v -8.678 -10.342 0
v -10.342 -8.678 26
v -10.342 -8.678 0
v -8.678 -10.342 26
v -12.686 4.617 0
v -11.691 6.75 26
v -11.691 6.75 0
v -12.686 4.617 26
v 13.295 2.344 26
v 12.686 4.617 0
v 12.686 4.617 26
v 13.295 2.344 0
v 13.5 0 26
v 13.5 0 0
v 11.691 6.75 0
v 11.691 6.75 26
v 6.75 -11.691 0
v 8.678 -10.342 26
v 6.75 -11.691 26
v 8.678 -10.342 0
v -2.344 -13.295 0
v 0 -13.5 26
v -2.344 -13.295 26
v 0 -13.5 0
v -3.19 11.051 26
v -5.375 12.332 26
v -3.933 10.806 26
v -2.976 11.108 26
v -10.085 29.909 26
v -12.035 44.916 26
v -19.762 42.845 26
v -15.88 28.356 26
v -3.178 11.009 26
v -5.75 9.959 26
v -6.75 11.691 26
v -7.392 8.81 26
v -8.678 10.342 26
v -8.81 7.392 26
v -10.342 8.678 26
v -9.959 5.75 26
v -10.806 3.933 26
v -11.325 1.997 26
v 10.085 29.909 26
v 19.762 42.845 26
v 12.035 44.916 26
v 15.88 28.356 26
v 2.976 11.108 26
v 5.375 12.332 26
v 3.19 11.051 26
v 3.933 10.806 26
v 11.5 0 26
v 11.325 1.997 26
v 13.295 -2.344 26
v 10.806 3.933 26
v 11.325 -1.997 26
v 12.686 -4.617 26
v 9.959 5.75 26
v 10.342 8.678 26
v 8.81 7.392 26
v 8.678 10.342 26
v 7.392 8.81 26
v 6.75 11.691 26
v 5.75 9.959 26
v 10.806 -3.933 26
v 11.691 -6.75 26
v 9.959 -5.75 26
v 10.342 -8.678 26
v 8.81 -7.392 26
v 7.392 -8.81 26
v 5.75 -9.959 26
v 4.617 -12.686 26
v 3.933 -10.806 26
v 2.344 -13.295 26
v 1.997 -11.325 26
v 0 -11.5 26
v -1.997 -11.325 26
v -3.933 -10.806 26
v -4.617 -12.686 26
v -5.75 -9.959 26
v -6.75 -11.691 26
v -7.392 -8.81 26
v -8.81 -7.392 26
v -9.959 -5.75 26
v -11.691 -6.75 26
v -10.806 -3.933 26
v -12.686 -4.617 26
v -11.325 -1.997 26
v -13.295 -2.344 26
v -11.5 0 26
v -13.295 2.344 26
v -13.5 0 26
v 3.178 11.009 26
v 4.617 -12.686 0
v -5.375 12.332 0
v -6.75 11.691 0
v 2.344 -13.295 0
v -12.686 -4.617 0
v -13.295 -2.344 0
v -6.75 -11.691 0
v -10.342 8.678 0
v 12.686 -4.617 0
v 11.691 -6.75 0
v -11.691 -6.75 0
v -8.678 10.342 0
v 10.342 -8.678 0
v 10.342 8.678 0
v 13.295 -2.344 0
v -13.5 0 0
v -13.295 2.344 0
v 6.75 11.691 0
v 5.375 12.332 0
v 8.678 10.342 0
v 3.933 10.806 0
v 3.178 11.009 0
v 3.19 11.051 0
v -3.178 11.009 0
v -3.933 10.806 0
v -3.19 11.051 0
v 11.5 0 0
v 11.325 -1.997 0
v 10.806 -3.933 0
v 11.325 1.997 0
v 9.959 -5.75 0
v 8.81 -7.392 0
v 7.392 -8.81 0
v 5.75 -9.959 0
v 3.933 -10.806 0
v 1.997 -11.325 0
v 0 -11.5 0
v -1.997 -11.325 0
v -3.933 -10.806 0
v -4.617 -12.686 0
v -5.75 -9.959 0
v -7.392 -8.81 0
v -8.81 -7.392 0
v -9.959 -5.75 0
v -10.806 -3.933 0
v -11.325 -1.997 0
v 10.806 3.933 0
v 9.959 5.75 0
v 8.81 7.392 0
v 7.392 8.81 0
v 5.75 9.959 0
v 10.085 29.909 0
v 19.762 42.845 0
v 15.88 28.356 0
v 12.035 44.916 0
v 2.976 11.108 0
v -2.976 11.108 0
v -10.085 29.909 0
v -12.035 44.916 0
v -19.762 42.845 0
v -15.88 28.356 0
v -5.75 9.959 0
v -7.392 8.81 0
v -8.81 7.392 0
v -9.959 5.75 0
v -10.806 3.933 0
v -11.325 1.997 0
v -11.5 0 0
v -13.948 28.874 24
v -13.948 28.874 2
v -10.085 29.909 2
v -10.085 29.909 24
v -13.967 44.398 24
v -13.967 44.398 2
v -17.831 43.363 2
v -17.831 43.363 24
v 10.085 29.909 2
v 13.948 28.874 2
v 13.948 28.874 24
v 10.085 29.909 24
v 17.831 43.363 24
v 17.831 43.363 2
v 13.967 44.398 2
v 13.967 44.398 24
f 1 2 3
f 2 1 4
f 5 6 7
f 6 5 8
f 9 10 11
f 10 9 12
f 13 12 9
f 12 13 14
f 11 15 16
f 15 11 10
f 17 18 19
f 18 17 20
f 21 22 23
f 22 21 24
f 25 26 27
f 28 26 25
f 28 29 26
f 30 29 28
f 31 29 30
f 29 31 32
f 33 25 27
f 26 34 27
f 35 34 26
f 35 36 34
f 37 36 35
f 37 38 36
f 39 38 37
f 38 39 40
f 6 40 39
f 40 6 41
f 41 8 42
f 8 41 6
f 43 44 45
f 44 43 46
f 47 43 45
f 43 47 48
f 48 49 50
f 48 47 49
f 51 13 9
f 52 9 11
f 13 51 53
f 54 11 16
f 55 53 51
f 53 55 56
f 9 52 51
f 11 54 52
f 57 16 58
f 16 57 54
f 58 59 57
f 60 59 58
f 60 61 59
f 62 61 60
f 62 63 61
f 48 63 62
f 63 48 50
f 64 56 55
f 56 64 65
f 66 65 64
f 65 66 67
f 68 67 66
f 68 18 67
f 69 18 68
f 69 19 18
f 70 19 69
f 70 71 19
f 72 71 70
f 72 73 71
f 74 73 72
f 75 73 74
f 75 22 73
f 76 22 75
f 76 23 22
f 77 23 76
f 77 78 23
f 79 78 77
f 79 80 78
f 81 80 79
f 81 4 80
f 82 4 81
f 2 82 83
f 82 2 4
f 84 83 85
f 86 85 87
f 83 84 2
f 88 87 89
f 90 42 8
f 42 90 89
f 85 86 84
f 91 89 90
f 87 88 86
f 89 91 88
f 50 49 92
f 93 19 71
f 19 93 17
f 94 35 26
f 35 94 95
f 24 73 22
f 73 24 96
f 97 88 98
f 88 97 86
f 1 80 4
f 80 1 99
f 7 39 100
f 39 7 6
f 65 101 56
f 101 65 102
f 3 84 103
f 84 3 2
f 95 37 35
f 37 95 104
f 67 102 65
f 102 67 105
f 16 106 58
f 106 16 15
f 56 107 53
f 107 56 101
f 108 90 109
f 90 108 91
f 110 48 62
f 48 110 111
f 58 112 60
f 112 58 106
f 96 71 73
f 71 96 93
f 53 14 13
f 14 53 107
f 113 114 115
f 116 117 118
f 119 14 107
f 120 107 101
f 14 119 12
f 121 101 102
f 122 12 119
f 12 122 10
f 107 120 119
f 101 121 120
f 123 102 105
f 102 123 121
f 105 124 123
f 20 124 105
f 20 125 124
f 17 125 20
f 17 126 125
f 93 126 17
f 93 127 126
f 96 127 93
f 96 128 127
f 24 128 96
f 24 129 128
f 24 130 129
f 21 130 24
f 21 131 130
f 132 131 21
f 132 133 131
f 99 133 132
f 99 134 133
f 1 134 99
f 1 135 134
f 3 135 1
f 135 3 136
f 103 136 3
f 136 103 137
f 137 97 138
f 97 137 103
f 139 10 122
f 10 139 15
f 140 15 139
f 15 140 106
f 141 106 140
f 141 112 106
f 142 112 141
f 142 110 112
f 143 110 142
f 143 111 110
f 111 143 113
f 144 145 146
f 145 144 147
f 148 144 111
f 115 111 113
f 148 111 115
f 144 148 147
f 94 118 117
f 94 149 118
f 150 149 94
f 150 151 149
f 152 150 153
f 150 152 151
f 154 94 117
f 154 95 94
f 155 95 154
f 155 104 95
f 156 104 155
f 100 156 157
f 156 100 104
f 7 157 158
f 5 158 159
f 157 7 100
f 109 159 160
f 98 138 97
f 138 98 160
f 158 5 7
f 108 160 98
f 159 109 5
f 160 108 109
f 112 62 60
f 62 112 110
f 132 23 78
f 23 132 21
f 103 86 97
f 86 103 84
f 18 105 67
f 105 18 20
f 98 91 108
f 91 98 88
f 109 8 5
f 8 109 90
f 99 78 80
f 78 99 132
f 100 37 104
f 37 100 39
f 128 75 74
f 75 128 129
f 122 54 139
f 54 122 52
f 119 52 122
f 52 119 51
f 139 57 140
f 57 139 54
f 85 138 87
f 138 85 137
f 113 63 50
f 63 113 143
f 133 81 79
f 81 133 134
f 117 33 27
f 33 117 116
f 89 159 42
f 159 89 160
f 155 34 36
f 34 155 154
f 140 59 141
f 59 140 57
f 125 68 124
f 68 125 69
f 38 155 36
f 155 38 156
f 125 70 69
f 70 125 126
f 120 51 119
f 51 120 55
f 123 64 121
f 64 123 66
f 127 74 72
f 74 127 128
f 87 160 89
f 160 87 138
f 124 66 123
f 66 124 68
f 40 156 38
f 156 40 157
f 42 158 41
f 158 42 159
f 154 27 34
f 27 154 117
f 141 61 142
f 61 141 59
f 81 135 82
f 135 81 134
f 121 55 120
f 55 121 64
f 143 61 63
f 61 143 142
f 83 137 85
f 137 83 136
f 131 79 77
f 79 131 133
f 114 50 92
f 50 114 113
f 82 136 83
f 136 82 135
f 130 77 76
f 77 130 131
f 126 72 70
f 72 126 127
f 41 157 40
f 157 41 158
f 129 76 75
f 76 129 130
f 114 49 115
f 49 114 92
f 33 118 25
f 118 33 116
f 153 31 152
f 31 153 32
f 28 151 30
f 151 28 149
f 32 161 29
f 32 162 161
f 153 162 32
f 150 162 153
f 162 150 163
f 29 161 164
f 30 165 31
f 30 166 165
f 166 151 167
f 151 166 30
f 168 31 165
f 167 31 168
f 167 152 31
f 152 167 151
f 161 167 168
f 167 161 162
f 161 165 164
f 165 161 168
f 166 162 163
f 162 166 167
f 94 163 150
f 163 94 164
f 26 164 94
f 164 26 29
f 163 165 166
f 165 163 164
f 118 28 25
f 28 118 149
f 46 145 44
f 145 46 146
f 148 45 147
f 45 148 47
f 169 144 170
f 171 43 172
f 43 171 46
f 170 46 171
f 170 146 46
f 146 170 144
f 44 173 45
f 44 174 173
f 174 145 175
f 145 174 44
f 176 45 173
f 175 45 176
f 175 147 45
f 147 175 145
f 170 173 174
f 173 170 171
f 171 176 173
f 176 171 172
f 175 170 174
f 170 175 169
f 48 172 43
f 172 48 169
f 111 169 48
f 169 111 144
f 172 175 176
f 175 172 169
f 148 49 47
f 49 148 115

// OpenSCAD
/**************************************************/
/* Fichier: pince_cuisine.scad                    */
/* Crée par: Rom1 - CANEL - https://www.canel.ch  */
/* Date: 22 juillet 2017                          */
/* Liscence: Creative Commons: (BY SA)            */
/*           Attribution - Partage dans les Mêmes */
/*           Conditions 4.0 International.        */
/* Programme: openscad                            */
/* Déscription: Pince paramétrable pour mettre	  */
/*              des services de cuisine.          */
/**************************************************/


/*************/
/* Variables */
/*************/

epaisseur = 2;						// Epaisseur de couche

/* Diamétre & angle du ressort */
angle = 30;							// Angle de la pince (MAX 55°)
diametre = 25;						// Diamètre du ressort

/* Ouverture pour enfiler le service */
ouverture_service_x = 4;		// Epaisseur du service
ouverture_service_y = 15;		// Longueur de la petite encoche
ouverture_service_z = 22;		// Hauteur du service

longueur_encoche = 35;	// Longueur totale de l'encoche	


/* Paramètre avancé*/
$fn = 36;      // Résolution de l'anneau
hauteur = ouverture_service_z+2*epaisseur;	// Hauteur de la pince


/***********/
/* Modules */
/***********/

/* La moitier de la partie ressore de la pince */
module ressore(
			ar,					// Angle ressort
			dia,					// Diamètre ressort
			ep,					// Epaisseur
			h						// Hauteur
){
	// Calcule la distance opposée de la moitier de l'angle
	function opp(alpha) = tan(alpha)*dia/2;

	difference(){
		cylinder(h, d=dia+ep);
		cylinder(h, d=dia-ep);
		linear_extrude(h)
			polygon([[0, 0], [0, dia], [opp(ar), dia]], [[0,1,2]]);
mirror([1,0,0])
		linear_extrude(h)
			polygon([[0, 0], [0, dia], [opp(ar), dia]], [[0,1,2]]);
	}
}

/* L'encoche */
module encoche(
			osx,					// Ouverture pour le service x
			osy,					// Ouverture pour le service y
			osz,					// Ouverture pour le service z
			ep,					// Epaisseur de couche
			l						// Longueur de l'encoche
){
	cube([ep, l, osz+2*ep]);
	difference(){
				cube([osx+2*ep, osy, osz+2*ep]);
		translate([ep,0,ep])
			cube([osx, osy, osz]);
	}
}

/* Le ressort + les 2 encoches	 */
module pince(
			aa,					// Angle ressort
			dia,					// Diamètre ressort
			ep,					// Epaisseur
			h,						// Hauteur
			osx,					// Ouverture pour le service x
			osy,					// Ouverture pour le service y
			osz,					// Ouverture pour le service z
			l						// Longueur de l'encoche
){
	ressore(aa, dia, ep, h);

	rotate([0, 0, 180+aa/2])
		translate([0, -l-dia/2+ep/2, 0])
			mirror([0,0,0])
				encoche(
					osx,
					osy,
					osz,
					ep,
					l
				);

	rotate([0, 0, -aa/2])
		translate([0, l+dia/2-ep/2, 0])
			mirror([0,1,0])
				encoche(
					osx,
					osy,
					osz,
					ep,
					l
				);
}

/***********************/
/* Programme principal */
/***********************/



	pince(
		angle,
		diametre,
		epaisseur,
		hauteur,
		ouverture_service_x,
		ouverture_service_y,
		ouverture_service_z,
		longueur_encoche
	);
